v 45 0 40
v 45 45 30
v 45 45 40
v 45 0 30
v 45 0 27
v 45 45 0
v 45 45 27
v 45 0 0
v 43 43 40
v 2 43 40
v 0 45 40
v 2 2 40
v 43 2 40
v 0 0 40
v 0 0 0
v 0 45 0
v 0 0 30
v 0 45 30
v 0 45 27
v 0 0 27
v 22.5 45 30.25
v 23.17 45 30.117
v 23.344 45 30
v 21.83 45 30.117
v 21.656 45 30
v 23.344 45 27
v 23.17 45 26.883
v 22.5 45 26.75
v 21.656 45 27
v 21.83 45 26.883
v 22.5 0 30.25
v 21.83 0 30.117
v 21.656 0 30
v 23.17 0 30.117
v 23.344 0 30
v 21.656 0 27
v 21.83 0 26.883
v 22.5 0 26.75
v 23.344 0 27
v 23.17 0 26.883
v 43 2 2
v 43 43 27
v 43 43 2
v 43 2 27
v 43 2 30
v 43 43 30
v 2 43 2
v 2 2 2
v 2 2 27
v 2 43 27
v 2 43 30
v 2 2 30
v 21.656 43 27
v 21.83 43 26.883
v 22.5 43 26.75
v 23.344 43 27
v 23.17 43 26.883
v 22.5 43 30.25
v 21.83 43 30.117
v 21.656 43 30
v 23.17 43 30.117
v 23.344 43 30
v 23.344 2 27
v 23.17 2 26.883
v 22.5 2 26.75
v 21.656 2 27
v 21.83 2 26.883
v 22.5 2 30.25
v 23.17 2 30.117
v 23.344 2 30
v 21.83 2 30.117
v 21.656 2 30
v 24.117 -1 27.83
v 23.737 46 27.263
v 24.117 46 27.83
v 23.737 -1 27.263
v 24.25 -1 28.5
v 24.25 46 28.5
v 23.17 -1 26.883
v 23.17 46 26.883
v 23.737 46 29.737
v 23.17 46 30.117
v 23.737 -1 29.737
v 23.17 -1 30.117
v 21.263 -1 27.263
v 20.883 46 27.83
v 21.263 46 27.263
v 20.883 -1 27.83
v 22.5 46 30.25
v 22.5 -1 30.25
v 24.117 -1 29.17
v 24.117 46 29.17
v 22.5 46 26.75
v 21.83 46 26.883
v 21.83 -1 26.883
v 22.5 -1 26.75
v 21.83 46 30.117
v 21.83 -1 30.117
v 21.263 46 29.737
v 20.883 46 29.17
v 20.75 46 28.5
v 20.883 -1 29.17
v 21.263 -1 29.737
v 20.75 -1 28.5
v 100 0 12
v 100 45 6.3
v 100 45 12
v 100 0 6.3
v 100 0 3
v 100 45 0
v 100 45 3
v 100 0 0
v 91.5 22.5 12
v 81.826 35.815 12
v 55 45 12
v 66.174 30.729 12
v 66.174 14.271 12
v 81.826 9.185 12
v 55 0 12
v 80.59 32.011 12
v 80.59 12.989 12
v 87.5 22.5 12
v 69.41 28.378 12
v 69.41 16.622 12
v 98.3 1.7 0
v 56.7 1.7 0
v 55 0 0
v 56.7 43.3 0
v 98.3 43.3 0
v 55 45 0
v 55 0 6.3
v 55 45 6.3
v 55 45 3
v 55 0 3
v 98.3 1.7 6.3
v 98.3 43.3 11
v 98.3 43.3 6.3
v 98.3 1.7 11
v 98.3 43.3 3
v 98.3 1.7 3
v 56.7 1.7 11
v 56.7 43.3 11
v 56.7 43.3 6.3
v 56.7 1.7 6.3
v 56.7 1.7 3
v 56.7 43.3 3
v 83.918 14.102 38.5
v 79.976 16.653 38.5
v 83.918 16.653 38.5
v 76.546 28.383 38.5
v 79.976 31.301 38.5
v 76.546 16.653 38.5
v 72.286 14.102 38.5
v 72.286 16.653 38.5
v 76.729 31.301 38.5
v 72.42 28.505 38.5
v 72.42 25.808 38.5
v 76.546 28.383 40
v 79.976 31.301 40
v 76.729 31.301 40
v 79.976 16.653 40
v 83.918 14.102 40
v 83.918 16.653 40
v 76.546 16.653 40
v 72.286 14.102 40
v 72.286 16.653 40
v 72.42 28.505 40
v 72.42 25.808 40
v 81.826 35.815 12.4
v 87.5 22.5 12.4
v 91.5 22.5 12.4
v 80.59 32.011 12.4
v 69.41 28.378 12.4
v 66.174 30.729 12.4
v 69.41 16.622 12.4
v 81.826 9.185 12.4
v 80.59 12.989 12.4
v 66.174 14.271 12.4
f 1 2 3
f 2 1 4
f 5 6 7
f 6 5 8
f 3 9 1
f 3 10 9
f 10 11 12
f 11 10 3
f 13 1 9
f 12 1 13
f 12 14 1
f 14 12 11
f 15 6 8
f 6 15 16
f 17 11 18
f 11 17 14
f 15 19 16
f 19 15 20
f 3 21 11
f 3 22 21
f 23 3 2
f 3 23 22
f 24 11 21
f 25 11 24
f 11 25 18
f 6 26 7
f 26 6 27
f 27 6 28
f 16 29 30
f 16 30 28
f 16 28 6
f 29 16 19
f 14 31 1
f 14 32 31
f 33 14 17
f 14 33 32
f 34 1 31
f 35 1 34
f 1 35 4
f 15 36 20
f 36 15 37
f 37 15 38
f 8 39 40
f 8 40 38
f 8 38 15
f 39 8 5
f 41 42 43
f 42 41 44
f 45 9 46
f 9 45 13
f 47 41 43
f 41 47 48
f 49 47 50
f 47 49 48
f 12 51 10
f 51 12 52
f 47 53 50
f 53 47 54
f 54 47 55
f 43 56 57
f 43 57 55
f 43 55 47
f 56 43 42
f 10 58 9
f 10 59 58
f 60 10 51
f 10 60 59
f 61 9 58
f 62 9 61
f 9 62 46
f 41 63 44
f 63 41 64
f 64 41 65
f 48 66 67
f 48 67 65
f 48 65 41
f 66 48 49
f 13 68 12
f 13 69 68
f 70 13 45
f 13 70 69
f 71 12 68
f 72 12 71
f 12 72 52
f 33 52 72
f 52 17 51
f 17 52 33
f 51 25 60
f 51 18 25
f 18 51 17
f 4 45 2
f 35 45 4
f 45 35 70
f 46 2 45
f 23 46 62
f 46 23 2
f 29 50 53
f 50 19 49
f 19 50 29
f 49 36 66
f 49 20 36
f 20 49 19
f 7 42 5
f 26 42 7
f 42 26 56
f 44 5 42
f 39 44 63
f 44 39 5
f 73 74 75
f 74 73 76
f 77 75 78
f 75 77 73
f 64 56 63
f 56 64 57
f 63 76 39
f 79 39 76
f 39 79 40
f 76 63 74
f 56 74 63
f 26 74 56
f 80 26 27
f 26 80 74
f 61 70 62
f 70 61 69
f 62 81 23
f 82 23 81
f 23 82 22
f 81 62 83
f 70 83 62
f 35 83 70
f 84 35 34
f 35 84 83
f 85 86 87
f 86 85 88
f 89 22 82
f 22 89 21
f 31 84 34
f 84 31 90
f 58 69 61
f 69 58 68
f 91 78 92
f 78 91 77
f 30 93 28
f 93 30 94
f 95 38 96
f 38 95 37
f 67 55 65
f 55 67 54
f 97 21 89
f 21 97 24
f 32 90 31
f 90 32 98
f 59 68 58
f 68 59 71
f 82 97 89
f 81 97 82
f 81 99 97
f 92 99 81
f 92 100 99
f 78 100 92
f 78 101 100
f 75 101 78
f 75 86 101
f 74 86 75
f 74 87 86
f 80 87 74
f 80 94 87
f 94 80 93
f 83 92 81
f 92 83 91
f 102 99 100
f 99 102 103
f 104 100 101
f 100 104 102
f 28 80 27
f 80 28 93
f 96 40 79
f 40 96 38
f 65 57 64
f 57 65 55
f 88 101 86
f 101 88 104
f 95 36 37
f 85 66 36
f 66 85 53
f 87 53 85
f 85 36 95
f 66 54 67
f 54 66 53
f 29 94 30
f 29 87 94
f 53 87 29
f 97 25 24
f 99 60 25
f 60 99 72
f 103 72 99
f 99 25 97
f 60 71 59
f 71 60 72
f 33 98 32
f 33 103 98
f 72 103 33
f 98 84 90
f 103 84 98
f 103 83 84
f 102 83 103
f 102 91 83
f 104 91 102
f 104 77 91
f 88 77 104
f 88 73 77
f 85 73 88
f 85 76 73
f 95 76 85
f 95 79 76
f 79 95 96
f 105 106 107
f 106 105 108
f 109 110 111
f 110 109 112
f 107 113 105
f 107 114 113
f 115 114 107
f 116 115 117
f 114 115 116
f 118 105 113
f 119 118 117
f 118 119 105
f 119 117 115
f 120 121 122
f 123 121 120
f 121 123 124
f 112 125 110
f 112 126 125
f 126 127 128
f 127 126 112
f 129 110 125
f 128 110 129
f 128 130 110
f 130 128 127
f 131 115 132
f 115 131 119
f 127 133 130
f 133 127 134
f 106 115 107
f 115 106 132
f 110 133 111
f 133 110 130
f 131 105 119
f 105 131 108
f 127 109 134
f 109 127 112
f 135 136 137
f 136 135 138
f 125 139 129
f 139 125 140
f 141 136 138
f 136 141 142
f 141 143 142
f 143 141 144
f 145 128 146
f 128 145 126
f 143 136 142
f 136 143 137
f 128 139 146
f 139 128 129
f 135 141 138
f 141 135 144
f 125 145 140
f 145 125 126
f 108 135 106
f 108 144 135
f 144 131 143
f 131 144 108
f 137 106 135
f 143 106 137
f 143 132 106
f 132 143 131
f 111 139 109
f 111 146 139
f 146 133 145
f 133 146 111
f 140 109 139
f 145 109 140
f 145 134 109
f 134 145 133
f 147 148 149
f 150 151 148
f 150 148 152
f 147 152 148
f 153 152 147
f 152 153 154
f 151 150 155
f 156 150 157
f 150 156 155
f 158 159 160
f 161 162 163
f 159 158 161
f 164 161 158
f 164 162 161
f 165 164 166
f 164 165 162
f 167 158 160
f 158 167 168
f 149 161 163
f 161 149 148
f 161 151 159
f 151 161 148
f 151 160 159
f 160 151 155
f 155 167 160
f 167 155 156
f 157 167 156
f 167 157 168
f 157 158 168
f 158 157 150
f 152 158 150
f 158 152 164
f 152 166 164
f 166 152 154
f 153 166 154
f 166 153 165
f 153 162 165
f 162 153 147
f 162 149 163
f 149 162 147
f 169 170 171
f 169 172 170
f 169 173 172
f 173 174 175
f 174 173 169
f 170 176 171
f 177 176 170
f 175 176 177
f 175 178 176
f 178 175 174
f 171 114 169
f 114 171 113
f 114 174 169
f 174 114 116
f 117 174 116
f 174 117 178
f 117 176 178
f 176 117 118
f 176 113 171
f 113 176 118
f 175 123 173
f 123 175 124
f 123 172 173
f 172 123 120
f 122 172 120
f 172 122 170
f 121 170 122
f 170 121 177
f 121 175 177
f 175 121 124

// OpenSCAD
// Advent Calendar Mini Box - Stackable, Numbered
// Print 24 copies (different number each) — sells as set
// PLA — 0.2mm, 3 walls, 15% infill
// Lid snaps on, hinged or separate

BOX_W   = 45;
BOX_D   = 45;
BOX_H   = 40;
LID_H   = 10;
WALL_T  = 2.0;
SNAP_H  = 3.0;
SNAP_D  = 3.5;
NUMBER  = 1;    // Change 1-24 for each box

module number_emboss(n) {
    // Simple raised digit — adjust translate per digit
    str_n = str(n);
    translate([BOX_W/2, BOX_D/2, BOX_H - WALL_T + 0.5])
        linear_extrude(1.5)
            text(str_n, size = 18, halign = "center", valign = "center",
                 font = "Liberation Sans:style=Bold");
}

module box_body() {
    difference() {
        cube([BOX_W, BOX_D, BOX_H]);
        translate([WALL_T, WALL_T, WALL_T])
            cube([BOX_W - WALL_T*2, BOX_D - WALL_T*2, BOX_H]);
        // Snap groove near top
        translate([-1, -1, BOX_H - LID_H - SNAP_H])
            cube([BOX_W + 2, BOX_D + 2, SNAP_H]);
    }
    // Snap bead
    translate([BOX_W/2, -1, BOX_H - LID_H - SNAP_H/2])
        rotate([-90, 0, 0])
            cylinder(d = SNAP_D, h = BOX_D + 2, $fn = 16);
}

module lid() {
    difference() {
        cube([BOX_W, BOX_D, LID_H + WALL_T]);
        // Inner socket
        translate([WALL_T - 0.3, WALL_T - 0.3, -1])
            cube([BOX_W - WALL_T*2 + 0.6, BOX_D - WALL_T*2 + 0.6, LID_H + 2]);
        // Snap groove to receive bead
        translate([-1, -1, WALL_T + 1])
            cube([BOX_W + 2, BOX_D + 2, SNAP_H + 0.3]);
    }
    // Number on lid top
    number_emboss(NUMBER);
    // Star decoration around number
    translate([BOX_W/2, BOX_D/2, LID_H + WALL_T - 0.4])
        linear_extrude(0.8)
            difference() {
                circle(r = 14, $fn = 5);
                circle(r = 10, $fn = 5);
            }
}

// Layout
box_body();
translate([BOX_W + 10, 0, 0]) lid();
